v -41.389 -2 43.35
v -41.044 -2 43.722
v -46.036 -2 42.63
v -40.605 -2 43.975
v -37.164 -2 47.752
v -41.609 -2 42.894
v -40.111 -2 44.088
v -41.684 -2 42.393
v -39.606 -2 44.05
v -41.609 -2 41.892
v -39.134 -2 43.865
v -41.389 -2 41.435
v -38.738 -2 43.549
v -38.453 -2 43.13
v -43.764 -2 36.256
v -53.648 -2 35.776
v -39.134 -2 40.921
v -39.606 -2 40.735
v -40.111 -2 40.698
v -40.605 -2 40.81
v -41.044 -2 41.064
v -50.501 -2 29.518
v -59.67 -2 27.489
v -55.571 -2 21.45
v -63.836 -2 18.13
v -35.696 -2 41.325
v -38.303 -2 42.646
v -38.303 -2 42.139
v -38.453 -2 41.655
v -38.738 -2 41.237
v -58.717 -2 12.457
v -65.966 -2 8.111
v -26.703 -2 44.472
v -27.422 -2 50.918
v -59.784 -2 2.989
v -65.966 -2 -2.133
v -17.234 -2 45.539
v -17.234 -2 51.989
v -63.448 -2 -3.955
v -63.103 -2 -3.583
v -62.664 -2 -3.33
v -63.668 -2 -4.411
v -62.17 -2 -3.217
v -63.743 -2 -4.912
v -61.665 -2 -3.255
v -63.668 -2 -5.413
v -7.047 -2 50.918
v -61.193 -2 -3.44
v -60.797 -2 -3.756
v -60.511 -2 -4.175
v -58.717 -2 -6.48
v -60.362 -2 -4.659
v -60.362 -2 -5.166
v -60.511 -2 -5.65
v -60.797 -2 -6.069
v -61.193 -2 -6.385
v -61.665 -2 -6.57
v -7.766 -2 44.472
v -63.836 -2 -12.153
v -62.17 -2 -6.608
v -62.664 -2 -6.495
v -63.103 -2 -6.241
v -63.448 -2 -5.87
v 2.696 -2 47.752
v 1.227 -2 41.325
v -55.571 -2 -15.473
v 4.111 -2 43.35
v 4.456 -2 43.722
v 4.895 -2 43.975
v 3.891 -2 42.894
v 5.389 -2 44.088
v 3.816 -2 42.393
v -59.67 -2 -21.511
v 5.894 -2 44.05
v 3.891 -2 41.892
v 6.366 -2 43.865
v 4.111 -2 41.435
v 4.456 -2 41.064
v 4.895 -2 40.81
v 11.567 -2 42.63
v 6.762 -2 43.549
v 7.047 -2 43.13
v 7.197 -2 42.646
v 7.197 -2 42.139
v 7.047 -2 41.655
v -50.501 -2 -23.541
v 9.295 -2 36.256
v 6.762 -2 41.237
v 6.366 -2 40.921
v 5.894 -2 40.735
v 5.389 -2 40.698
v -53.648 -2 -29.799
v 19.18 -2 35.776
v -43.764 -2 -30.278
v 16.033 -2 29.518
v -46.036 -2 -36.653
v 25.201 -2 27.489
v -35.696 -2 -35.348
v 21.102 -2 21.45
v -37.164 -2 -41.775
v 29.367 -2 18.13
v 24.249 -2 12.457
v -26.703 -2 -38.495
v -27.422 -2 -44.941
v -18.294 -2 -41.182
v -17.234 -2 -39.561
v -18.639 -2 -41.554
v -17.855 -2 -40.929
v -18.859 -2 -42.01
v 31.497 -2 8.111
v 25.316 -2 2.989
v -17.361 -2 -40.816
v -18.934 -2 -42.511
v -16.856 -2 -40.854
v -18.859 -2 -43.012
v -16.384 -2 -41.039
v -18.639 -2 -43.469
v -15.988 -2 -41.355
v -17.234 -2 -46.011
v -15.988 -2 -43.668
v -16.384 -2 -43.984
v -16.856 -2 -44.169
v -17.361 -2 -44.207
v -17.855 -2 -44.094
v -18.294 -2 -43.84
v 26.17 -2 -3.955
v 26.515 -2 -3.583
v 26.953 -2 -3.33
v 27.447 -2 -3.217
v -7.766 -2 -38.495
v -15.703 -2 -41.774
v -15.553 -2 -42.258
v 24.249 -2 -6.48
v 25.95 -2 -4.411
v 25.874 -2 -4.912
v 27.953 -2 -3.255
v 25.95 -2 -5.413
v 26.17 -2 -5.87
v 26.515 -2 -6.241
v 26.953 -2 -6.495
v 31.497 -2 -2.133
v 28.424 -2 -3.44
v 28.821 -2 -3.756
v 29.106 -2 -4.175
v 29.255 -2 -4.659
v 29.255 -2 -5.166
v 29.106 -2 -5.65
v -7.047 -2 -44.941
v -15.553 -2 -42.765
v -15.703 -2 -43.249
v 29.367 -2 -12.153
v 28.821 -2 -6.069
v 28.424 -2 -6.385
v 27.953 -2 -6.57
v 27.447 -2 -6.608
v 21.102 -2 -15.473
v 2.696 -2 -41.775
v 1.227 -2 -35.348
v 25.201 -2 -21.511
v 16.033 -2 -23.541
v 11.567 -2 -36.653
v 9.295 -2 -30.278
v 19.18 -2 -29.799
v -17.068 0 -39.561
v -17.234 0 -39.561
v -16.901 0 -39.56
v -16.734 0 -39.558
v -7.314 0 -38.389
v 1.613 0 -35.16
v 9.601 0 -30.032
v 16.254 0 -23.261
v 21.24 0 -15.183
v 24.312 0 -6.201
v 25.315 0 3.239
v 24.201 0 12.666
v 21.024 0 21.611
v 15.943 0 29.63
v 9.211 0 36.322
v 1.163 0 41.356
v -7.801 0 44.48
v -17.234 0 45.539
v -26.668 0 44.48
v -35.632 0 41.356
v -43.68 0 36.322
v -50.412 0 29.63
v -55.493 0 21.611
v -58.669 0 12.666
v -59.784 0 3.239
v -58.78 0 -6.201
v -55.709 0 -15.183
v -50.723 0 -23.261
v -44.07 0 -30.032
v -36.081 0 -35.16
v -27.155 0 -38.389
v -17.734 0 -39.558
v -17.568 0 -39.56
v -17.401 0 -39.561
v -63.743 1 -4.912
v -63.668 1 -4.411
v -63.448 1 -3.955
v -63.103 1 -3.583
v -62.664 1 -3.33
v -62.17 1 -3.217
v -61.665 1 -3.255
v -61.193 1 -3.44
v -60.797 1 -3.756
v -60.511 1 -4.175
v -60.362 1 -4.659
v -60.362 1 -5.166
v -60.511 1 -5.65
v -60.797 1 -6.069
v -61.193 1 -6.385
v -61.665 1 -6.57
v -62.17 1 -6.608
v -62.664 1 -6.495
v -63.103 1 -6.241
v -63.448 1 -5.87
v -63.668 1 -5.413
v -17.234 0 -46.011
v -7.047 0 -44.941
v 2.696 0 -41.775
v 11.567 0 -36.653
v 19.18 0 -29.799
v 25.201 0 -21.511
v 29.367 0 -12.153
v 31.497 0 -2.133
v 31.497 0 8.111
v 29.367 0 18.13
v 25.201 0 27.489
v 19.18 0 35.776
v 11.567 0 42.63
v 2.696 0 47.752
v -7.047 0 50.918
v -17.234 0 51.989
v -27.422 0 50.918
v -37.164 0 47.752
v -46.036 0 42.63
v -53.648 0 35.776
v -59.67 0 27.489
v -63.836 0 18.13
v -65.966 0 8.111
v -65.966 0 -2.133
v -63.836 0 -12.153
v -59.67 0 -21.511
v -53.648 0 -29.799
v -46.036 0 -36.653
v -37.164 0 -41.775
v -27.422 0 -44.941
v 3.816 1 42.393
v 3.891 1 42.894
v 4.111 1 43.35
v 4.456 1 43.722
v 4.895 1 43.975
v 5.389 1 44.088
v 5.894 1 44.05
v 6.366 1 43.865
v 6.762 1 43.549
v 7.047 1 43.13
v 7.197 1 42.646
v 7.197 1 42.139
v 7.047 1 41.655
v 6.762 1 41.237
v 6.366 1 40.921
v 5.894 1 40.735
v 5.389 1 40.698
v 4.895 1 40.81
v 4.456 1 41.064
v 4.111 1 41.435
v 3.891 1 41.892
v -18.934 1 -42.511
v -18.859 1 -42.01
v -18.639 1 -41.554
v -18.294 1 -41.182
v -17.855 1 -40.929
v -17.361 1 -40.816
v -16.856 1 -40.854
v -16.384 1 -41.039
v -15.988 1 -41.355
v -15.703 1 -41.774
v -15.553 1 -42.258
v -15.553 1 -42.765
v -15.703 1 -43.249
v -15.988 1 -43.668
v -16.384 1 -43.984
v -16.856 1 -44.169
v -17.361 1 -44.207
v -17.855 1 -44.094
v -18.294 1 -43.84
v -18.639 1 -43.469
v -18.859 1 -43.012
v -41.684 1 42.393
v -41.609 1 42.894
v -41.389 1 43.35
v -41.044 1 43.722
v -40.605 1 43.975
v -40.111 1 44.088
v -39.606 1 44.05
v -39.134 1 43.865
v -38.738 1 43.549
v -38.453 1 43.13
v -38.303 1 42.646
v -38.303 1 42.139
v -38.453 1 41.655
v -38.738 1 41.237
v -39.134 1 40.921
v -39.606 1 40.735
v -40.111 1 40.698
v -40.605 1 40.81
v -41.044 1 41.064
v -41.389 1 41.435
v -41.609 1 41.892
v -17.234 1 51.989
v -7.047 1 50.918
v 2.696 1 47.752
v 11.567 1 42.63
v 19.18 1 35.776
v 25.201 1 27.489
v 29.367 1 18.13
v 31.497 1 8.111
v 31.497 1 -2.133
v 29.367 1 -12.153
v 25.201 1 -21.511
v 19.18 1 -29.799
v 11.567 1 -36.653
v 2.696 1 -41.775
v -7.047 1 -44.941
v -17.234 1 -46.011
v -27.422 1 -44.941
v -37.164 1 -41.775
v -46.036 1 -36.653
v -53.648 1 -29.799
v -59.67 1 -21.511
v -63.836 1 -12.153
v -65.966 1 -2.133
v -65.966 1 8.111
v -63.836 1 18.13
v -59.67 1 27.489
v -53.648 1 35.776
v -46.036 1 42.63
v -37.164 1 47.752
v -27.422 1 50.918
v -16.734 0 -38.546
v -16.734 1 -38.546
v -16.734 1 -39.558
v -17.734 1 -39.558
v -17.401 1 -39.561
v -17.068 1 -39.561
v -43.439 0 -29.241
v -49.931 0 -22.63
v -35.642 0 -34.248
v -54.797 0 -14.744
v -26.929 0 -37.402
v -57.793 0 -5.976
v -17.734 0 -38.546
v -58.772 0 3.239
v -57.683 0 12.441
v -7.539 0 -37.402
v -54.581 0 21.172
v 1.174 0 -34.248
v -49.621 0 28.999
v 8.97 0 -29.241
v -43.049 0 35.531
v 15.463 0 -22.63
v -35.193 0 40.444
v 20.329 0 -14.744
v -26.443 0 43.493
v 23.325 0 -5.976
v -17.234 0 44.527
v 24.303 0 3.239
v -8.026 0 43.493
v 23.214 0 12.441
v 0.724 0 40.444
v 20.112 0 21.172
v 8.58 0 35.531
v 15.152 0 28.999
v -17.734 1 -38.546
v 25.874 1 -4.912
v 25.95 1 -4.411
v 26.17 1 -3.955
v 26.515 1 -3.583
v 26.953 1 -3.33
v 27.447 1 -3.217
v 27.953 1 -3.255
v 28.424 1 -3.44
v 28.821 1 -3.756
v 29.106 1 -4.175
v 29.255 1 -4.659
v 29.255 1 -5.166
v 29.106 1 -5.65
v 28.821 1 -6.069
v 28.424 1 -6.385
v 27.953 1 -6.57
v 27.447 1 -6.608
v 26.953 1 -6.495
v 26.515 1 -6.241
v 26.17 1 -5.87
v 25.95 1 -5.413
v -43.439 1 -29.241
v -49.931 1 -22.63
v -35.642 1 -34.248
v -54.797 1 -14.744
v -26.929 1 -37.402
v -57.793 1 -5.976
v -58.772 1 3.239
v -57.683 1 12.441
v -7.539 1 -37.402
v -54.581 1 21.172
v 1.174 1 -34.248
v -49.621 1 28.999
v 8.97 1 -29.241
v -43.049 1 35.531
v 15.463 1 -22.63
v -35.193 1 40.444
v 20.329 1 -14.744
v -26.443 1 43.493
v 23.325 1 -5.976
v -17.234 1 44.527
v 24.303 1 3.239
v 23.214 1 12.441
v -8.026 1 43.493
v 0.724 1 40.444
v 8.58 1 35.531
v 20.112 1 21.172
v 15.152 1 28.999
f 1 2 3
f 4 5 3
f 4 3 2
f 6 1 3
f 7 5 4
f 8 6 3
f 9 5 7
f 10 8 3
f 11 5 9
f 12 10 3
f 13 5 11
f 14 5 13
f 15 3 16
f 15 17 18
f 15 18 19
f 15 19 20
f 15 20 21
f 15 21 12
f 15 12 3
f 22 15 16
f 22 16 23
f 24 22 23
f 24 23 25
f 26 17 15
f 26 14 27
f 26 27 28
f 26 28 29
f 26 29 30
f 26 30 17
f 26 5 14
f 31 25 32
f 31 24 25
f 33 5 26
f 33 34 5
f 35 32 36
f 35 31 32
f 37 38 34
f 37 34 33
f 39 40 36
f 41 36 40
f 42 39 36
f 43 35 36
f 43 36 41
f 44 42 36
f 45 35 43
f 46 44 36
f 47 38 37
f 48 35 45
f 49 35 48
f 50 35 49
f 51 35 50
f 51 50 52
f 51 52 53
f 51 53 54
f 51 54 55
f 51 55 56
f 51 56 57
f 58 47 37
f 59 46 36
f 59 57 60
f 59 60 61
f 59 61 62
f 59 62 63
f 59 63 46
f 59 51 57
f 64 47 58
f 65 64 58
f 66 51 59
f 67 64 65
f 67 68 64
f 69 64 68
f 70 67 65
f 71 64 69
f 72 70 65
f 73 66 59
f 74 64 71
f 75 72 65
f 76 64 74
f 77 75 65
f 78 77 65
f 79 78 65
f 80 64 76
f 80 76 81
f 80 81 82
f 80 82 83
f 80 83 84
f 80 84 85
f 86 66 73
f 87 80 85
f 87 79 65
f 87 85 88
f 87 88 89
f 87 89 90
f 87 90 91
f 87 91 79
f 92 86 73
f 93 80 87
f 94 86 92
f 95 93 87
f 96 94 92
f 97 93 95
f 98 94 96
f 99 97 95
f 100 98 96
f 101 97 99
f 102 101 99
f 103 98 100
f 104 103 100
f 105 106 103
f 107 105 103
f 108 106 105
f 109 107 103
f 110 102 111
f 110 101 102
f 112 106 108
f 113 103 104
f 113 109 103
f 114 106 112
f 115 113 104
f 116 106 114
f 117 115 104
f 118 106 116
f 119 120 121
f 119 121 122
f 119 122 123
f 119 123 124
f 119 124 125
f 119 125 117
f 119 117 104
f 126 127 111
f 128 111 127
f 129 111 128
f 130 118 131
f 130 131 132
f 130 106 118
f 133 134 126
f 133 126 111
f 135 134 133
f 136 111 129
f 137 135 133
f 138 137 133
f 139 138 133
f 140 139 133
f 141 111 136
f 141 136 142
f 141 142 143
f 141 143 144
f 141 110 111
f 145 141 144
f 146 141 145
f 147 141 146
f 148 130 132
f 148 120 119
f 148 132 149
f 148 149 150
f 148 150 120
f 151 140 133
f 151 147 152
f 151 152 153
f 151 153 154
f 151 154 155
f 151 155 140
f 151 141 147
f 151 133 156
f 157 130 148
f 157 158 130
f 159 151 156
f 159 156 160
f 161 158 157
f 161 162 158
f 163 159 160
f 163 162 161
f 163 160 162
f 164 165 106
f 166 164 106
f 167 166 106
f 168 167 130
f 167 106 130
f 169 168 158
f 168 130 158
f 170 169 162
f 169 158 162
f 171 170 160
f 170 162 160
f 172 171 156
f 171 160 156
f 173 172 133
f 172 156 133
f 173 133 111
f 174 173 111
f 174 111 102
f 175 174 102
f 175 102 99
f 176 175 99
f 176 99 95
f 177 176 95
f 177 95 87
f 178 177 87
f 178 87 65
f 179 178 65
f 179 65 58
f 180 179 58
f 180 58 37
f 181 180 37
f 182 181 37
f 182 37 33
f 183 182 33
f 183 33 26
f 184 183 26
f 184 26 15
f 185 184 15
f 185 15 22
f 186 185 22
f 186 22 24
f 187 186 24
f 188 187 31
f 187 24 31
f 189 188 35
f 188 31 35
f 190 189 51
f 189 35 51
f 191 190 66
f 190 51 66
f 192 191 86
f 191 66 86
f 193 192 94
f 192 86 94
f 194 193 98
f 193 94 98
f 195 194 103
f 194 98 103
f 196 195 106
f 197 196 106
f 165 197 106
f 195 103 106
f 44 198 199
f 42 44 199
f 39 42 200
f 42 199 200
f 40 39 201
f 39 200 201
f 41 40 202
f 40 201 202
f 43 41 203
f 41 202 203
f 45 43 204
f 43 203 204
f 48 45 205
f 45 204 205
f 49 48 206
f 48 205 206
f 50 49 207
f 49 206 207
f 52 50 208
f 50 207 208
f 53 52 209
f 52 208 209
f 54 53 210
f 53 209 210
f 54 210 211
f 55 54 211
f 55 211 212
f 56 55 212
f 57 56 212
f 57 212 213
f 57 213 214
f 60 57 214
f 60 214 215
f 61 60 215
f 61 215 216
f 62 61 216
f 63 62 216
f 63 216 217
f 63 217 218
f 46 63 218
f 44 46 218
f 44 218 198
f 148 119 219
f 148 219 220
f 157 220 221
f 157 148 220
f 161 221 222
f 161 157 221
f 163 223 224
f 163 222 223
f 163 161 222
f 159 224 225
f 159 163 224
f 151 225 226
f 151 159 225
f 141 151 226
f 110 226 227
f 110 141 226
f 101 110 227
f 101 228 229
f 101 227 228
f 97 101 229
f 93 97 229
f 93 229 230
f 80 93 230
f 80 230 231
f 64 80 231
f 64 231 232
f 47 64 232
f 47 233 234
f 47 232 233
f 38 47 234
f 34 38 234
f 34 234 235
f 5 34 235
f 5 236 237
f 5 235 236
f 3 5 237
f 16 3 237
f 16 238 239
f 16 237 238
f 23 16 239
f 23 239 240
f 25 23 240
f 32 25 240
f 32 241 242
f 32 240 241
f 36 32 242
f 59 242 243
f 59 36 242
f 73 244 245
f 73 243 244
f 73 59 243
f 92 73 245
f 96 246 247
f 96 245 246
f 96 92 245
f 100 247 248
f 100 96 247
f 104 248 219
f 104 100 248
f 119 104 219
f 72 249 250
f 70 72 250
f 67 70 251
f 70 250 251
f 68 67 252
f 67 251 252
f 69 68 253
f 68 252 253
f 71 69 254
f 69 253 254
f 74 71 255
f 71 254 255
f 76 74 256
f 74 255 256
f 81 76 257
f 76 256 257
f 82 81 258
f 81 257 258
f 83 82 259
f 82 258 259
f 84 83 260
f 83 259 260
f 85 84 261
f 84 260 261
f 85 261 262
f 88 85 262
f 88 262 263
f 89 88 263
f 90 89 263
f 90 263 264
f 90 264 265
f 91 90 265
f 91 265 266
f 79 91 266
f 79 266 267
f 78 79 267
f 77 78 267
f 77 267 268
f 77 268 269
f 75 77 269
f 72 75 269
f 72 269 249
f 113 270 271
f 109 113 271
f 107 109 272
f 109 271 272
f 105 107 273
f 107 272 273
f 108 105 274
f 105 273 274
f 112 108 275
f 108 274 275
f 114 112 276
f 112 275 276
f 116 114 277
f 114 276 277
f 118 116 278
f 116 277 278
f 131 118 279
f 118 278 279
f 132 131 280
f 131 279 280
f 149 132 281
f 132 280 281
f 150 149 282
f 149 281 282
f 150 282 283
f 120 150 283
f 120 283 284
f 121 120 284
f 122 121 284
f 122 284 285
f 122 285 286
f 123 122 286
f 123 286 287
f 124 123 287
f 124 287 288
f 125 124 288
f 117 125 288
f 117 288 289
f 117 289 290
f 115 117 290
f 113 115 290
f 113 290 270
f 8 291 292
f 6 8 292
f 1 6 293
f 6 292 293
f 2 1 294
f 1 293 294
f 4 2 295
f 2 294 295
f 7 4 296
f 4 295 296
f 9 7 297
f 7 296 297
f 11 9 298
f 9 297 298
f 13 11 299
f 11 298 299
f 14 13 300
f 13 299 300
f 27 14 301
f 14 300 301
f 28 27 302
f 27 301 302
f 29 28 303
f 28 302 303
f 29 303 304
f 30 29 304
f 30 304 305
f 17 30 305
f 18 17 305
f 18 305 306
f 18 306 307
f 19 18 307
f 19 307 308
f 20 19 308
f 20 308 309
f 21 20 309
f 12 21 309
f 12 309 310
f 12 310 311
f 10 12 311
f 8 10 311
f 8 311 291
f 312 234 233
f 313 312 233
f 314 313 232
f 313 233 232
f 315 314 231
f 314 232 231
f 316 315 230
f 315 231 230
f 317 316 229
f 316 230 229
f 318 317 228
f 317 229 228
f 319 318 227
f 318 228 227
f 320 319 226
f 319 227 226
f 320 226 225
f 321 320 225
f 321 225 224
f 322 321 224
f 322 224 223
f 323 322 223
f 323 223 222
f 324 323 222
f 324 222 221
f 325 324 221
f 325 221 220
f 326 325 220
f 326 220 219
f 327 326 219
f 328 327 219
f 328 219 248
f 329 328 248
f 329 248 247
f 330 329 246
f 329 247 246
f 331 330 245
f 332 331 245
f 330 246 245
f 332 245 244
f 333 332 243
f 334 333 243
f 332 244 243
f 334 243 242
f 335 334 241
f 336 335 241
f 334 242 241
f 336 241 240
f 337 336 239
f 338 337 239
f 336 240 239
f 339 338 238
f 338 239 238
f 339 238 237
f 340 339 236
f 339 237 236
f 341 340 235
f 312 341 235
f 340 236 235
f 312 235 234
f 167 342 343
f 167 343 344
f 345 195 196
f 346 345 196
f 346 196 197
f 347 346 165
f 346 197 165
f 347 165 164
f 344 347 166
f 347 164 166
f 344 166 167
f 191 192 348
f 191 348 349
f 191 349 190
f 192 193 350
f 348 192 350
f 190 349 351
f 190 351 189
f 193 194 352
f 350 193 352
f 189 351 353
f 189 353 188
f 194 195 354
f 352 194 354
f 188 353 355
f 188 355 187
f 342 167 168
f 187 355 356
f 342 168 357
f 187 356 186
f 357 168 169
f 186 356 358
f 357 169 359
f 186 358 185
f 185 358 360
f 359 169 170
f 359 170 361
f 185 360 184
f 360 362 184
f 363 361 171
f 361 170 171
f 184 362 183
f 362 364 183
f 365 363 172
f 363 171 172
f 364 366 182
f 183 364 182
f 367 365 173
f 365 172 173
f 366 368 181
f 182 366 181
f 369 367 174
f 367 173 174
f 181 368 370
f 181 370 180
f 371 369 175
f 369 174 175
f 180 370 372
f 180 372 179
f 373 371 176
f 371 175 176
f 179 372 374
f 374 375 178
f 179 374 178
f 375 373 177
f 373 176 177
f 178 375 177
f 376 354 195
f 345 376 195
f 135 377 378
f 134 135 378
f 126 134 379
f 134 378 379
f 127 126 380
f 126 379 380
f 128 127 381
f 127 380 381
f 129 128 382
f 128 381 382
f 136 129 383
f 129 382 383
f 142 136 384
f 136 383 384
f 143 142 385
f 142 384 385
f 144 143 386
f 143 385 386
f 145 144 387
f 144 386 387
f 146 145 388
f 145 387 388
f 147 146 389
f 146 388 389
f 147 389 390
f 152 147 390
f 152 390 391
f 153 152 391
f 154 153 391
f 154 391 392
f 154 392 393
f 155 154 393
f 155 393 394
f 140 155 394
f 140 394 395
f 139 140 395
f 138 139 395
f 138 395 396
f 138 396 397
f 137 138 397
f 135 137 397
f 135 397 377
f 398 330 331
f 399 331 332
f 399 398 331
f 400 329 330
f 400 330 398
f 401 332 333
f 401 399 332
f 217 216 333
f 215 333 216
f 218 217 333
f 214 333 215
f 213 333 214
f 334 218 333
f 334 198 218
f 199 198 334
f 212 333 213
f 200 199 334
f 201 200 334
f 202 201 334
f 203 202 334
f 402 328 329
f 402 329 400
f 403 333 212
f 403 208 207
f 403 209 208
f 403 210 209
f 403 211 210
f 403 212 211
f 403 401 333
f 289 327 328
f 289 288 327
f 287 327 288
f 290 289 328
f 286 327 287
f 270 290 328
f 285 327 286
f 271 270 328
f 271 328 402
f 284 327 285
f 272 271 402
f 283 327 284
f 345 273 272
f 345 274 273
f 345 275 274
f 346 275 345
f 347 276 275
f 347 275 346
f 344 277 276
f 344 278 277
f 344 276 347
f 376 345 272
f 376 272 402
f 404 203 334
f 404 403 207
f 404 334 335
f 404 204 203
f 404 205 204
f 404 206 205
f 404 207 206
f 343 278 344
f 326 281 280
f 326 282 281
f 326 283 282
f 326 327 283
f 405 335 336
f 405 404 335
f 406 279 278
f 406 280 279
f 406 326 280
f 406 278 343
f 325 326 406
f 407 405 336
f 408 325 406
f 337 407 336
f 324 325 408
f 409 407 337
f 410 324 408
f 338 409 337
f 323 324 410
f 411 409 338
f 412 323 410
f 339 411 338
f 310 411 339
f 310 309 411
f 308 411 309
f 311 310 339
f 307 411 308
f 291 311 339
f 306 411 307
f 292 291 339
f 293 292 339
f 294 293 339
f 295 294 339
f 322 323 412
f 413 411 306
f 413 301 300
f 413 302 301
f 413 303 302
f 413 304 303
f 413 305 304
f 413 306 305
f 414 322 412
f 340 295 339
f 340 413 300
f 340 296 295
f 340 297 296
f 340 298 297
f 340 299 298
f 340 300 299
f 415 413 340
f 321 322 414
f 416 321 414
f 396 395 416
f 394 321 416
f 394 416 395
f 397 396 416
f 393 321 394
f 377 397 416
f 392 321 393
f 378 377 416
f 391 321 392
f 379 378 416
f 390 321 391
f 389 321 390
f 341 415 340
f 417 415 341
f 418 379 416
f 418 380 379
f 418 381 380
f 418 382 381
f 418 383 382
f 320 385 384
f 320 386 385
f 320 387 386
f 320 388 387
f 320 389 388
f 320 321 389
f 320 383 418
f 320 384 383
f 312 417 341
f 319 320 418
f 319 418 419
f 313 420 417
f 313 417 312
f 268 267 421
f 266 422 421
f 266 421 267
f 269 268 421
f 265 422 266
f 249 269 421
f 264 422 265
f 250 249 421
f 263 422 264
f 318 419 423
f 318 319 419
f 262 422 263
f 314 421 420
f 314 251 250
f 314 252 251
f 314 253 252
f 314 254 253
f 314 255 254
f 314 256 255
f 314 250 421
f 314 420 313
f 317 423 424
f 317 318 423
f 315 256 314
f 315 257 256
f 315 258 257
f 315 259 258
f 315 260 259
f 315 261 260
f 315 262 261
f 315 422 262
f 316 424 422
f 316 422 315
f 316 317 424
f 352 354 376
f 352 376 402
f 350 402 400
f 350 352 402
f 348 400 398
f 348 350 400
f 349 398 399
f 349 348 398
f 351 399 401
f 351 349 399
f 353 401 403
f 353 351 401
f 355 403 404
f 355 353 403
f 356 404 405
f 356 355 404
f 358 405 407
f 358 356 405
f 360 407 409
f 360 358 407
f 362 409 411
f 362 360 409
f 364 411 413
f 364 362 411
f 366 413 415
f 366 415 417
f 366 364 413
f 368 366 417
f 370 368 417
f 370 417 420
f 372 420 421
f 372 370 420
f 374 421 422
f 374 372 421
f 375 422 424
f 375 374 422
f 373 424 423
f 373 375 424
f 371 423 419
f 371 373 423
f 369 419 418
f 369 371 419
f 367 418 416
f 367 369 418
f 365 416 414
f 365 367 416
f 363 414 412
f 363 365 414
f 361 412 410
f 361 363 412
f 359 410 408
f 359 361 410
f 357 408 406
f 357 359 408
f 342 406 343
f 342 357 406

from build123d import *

# Parameters (mm, degrees)
SKETCH1_R           = 49
SKETCH1_R_2         = 41.538
BOSS_EXTRUDE1_DEPTH = 1
CUT_EXTRUDE1_START  = -10
CUT_EXTRUDE1_DEPTH  = 10
CUT_EXTRUDE2_DEPTH  = 10
BOSS_EXTRUDE2_START = 2
SKETCH4_R           = 49
SKETCH4_R_2         = 42.55
BOSS_EXTRUDE2_DEPTH = 2
SKETCH5_R           = 1.7
CUT_EXTRUDE3_DEPTH  = 95.04770922


with BuildPart() as part:
    # Sketch1 → Boss-Extrude1 (new body)
    with BuildSketch(Plane(origin=(0, 0, 0), x_dir=(1, 0, 0), z_dir=(0, 1, 0))):
        with Locations(Location((-17.234280104, -2.988648948, 0), (0, 0, 270))):
            Circle(SKETCH1_R)
        with Locations(Location((-17.234280104, -2.988648948, 0), (0, 0, 270))):
            Circle(SKETCH1_R_2, mode=Mode.SUBTRACT)
    extrude(amount=BOSS_EXTRUDE1_DEPTH)

    # Sketch2 → Cut-Extrude1 (cut)
    with BuildSketch(Plane(origin=(0, 1, 0), x_dir=(1, 0, 0), z_dir=(0, 1, 0)).offset(CUT_EXTRUDE1_START)):
        with BuildLine():
            Line((-16.734280104, 38.54634165), (-16.734280104, 39.546412401))
            ThreePointArc((-16.734280104, 39.546412401), (-17.234280104, 39.549351052), (-17.734280104, 39.546412401))
            Line((-17.734280104, 39.546412401), (-17.734280104, 38.54634165))
            ThreePointArc((-17.734280104, 38.54634165), (-17.234280104, 38.549351052), (-16.734280104, 38.54634165))
        make_face()
    extrude(amount=CUT_EXTRUDE1_DEPTH, mode=Mode.SUBTRACT)

    # Sketch3 → Cut-Extrude2 (cut)
    with BuildSketch(Plane.XZ):
        with BuildLine():
            Line((-17.734280104, -38.54634165), (-17.734280104, -39.55841323))
            ThreePointArc((-17.734280104, -39.55841323), (-17.234280104, -39.561351052), (-16.734280104, -39.55841323))
            Line((-16.734280104, -39.55841323), (-16.734280104, -38.54634165))
            ThreePointArc((-16.734280104, -38.54634165), (-17.234280104, -38.549351052), (-17.734280104, -38.54634165))
        make_face()
    extrude(amount=-CUT_EXTRUDE2_DEPTH, mode=Mode.SUBTRACT)

    # Sketch4 → Boss-Extrude2 (add)
    with BuildSketch(Plane.XZ.offset(BOSS_EXTRUDE2_START)):
        with Locations(Location((-17.234280104, 2.988648948, 0), (0, 0, 270))):
            Circle(SKETCH4_R)
        with Locations(Location((-17.234280104, 2.988648948, 0), (0, 0, 270))):
            Circle(SKETCH4_R_2, mode=Mode.SUBTRACT)
    extrude(amount=-BOSS_EXTRUDE2_DEPTH)

    # Sketch5 → Cut-Extrude3 (cut, through all)
    with BuildSketch(Plane(origin=(12.15729015, 4, 5.600017102), x_dir=(1, 0, 0), z_dir=(0, 1, 0))):
        with Locations(Location((-29.391570254, 48.111368154, 0), (0, 0, 180))):
            Circle(SKETCH5_R)
        with Locations(Location((-74.200323016, 10.512360238, 0), (0, 0, 180))):
            Circle(SKETCH5_R)
        with Locations(Location((-52.141570254, -36.792787718, 0), (0, 0, 180))):
            Circle(SKETCH5_R)
        with Locations(Location((-6.641570254, -36.792787718, 0), (0, 0, 180))):
            Circle(SKETCH5_R)
        with Locations(Location((15.417182508, 10.512360238, 0), (0, 0, 180))):
            Circle(SKETCH5_R)
    extrude(amount=-CUT_EXTRUDE3_DEPTH, mode=Mode.SUBTRACT)


solid = part.part
